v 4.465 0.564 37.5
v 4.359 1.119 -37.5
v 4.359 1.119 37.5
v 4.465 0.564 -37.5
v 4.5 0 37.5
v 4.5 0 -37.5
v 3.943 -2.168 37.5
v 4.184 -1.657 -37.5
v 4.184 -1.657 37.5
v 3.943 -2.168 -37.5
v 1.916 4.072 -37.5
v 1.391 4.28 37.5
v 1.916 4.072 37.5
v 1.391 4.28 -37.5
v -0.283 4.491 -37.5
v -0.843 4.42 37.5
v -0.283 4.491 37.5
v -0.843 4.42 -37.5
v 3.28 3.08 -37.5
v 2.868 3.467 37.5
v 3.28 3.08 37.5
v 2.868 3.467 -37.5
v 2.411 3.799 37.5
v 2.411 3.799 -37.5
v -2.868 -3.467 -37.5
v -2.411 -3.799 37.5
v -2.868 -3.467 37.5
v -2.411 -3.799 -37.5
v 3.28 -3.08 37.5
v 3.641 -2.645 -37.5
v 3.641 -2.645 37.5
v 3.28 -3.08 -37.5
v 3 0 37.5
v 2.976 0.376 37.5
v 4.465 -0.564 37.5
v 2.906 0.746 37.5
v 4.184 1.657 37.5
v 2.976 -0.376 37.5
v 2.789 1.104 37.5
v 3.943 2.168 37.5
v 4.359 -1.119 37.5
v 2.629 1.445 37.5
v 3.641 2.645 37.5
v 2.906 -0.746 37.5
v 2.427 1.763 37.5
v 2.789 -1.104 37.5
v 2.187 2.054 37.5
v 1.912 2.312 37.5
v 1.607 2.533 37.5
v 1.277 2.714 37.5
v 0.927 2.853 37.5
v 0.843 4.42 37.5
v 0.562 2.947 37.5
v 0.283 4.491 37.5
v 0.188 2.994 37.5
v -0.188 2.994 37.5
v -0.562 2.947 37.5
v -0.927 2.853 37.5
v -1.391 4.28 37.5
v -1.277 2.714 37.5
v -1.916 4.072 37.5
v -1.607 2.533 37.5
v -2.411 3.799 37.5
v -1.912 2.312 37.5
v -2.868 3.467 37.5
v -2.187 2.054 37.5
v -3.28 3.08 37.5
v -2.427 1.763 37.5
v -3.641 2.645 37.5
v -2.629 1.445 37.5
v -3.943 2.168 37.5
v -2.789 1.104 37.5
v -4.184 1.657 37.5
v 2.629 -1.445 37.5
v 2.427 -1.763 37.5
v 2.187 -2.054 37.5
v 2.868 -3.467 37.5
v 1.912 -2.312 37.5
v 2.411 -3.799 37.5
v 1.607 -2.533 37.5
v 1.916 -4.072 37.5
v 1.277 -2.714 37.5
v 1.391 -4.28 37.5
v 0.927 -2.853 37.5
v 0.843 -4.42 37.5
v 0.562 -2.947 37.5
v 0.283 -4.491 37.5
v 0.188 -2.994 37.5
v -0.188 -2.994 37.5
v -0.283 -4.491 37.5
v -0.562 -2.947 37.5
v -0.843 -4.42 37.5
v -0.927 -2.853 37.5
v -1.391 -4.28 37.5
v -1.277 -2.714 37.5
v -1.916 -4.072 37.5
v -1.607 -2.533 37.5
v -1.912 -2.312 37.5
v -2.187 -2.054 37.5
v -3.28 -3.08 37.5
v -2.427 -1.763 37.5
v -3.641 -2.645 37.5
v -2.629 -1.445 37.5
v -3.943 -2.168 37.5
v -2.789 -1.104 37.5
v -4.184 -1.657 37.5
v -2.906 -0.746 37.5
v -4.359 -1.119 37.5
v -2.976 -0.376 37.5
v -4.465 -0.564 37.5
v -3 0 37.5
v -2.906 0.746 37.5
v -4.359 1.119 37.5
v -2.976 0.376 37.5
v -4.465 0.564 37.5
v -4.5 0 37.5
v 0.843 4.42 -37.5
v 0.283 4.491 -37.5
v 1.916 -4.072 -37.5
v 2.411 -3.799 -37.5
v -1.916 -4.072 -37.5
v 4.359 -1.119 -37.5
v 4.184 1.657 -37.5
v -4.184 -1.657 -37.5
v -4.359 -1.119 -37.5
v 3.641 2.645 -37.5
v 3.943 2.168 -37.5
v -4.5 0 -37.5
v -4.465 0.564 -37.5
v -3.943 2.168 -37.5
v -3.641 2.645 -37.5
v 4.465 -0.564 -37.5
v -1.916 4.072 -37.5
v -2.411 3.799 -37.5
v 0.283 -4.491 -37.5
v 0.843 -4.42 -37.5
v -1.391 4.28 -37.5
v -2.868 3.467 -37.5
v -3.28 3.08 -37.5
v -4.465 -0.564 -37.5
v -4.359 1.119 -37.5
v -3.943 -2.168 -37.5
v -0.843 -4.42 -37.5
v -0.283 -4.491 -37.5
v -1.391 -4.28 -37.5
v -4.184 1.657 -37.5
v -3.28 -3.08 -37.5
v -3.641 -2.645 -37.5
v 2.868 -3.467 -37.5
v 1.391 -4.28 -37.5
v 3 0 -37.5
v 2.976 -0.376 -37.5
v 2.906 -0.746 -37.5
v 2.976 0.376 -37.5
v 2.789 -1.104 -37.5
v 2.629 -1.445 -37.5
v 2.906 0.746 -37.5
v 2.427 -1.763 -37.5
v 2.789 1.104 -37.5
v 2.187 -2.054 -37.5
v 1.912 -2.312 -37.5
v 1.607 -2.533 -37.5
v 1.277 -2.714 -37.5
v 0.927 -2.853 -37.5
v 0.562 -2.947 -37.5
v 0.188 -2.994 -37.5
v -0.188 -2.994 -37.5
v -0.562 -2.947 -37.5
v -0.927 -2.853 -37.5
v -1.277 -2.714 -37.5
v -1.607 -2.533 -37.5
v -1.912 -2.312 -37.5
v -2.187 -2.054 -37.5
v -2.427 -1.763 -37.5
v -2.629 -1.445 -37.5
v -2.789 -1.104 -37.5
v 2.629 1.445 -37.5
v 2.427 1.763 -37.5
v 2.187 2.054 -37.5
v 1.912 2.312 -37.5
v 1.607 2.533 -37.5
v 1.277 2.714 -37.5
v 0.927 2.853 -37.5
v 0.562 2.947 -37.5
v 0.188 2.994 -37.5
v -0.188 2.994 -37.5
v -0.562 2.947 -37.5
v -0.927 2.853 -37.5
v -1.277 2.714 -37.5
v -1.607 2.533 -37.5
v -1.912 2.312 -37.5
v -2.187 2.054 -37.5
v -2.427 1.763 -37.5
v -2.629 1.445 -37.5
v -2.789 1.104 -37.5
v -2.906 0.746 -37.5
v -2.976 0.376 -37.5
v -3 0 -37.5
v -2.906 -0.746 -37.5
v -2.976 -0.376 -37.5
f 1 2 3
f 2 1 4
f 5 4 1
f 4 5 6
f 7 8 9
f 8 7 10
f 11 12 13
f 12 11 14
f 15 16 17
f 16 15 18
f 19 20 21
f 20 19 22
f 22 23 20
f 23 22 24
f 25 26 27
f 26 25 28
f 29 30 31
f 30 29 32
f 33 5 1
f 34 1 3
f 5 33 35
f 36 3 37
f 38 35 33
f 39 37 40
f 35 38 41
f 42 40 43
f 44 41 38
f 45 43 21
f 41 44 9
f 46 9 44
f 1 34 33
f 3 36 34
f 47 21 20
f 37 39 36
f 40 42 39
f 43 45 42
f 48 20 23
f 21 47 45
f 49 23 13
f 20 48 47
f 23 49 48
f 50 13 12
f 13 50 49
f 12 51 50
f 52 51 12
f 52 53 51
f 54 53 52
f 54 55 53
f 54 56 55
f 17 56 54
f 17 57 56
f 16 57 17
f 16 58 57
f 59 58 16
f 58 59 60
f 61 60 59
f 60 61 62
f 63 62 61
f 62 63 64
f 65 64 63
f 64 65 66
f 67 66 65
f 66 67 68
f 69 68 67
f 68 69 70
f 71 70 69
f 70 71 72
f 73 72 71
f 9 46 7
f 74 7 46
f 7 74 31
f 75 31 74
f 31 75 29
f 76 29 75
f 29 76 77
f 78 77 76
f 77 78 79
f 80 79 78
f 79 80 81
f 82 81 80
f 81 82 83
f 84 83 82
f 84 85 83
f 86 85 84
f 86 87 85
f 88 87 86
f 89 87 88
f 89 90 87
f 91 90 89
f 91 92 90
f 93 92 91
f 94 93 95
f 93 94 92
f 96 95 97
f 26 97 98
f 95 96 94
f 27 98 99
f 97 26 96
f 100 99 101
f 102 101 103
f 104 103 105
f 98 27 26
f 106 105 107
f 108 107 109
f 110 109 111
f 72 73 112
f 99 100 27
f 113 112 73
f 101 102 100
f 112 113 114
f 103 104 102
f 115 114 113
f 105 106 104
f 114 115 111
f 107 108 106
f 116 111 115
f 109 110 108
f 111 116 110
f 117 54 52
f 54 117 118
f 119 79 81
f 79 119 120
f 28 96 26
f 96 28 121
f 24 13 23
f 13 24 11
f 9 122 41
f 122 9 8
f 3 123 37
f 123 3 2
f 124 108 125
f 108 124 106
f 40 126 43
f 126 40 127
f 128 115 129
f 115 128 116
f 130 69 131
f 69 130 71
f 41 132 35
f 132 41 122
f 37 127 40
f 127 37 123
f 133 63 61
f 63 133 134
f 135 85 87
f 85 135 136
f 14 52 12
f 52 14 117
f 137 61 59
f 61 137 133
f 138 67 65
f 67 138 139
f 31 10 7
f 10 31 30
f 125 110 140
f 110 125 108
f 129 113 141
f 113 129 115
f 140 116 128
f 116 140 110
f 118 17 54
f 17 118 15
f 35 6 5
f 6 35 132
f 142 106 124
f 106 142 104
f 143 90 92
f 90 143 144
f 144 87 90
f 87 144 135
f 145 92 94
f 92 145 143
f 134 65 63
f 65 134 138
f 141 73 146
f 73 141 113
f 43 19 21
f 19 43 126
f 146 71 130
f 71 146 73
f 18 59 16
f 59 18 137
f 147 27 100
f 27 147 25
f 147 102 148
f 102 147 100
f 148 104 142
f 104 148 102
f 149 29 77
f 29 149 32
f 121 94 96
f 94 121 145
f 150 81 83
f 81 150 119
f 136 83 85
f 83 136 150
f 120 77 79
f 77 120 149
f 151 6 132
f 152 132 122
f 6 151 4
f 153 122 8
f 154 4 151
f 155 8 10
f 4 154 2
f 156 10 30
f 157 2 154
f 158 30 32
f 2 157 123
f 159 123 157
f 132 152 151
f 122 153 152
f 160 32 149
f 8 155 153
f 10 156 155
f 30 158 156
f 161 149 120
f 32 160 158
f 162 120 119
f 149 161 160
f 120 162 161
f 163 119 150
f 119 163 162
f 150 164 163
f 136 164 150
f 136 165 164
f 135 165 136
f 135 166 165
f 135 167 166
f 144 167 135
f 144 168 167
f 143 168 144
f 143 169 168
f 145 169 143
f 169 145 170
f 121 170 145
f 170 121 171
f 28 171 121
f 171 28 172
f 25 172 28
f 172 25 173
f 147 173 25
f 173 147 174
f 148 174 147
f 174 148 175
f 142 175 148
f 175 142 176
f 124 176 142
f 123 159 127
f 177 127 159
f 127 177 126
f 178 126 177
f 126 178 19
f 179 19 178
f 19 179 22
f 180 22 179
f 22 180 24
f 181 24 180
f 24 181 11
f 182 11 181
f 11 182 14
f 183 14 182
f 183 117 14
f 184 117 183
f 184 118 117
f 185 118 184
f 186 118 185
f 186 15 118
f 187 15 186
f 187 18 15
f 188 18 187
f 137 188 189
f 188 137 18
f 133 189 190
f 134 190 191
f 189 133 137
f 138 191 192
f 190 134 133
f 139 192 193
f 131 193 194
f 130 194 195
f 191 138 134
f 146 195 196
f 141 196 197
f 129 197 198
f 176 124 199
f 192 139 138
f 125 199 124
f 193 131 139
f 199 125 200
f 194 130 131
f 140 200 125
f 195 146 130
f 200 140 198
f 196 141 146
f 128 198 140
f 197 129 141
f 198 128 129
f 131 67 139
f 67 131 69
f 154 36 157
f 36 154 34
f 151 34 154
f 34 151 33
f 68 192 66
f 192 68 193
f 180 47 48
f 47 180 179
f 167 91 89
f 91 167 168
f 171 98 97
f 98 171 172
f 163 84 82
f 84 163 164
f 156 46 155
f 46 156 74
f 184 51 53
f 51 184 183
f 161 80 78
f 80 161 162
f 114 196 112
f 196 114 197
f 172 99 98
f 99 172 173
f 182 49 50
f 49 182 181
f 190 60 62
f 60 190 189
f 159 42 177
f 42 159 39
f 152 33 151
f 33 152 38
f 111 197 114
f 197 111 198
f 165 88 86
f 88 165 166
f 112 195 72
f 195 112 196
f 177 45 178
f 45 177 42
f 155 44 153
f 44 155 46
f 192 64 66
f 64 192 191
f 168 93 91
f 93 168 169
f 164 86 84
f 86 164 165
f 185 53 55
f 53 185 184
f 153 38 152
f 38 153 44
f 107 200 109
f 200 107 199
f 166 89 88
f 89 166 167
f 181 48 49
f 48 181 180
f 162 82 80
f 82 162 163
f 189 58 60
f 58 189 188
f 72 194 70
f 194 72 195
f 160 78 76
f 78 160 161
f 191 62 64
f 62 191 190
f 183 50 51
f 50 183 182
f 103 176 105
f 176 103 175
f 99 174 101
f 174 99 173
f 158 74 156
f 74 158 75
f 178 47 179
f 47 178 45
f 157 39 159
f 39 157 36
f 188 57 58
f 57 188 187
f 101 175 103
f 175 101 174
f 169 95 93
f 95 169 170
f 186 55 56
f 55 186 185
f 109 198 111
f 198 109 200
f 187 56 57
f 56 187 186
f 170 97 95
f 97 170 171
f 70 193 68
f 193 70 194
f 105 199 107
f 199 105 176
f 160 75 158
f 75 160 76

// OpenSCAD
$fn = 50;


difference() {
	union() {
		translate(v = [0, 0, -37.5000000000]) {
			cylinder(h = 75, r = 4.5000000000);
		}
	}
	union() {
		translate(v = [0, 0, -100.0000000000]) {
			cylinder(h = 200, r = 3.0000000000);
		}
	}
}
